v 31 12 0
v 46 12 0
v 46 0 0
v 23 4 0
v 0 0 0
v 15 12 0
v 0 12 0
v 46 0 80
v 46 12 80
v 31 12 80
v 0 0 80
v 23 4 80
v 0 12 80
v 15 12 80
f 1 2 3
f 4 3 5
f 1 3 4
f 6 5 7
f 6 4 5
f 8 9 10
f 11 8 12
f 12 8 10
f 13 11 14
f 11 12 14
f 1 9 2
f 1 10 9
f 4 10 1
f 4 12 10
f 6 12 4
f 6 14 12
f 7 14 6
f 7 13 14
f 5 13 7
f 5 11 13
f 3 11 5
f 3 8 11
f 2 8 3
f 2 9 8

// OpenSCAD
$fn = 32;

// ----------------------------------------------------------------------
// V guide rail: vway, 46 mm wide
// ----------------------------------------------------------------------

// --- parameters (mm) ---
rail_w = 46;              // rail width, X
base_t = 12;              // base plate thickness
v_depth = 8;              // V feature depth / height
v_half_w = 8;             // half width of the V at the base face
plate_t = 80;             // rail length, Z (the extrusion height)
fit_tol = 0.1;            // declared fit tolerance (prompt contract)
free_tol = 0.5;           // declared free tolerance (prompt contract)

profile = [[0, 0], [46, 0], [46, 12], [31, 12], [23, 4], [15, 12], [0, 12]];  // primary outline, 7 points, counter clockwise

// --- the one profile operation ---
linear_extrude(height = plate_t) polygon(points = profile);
